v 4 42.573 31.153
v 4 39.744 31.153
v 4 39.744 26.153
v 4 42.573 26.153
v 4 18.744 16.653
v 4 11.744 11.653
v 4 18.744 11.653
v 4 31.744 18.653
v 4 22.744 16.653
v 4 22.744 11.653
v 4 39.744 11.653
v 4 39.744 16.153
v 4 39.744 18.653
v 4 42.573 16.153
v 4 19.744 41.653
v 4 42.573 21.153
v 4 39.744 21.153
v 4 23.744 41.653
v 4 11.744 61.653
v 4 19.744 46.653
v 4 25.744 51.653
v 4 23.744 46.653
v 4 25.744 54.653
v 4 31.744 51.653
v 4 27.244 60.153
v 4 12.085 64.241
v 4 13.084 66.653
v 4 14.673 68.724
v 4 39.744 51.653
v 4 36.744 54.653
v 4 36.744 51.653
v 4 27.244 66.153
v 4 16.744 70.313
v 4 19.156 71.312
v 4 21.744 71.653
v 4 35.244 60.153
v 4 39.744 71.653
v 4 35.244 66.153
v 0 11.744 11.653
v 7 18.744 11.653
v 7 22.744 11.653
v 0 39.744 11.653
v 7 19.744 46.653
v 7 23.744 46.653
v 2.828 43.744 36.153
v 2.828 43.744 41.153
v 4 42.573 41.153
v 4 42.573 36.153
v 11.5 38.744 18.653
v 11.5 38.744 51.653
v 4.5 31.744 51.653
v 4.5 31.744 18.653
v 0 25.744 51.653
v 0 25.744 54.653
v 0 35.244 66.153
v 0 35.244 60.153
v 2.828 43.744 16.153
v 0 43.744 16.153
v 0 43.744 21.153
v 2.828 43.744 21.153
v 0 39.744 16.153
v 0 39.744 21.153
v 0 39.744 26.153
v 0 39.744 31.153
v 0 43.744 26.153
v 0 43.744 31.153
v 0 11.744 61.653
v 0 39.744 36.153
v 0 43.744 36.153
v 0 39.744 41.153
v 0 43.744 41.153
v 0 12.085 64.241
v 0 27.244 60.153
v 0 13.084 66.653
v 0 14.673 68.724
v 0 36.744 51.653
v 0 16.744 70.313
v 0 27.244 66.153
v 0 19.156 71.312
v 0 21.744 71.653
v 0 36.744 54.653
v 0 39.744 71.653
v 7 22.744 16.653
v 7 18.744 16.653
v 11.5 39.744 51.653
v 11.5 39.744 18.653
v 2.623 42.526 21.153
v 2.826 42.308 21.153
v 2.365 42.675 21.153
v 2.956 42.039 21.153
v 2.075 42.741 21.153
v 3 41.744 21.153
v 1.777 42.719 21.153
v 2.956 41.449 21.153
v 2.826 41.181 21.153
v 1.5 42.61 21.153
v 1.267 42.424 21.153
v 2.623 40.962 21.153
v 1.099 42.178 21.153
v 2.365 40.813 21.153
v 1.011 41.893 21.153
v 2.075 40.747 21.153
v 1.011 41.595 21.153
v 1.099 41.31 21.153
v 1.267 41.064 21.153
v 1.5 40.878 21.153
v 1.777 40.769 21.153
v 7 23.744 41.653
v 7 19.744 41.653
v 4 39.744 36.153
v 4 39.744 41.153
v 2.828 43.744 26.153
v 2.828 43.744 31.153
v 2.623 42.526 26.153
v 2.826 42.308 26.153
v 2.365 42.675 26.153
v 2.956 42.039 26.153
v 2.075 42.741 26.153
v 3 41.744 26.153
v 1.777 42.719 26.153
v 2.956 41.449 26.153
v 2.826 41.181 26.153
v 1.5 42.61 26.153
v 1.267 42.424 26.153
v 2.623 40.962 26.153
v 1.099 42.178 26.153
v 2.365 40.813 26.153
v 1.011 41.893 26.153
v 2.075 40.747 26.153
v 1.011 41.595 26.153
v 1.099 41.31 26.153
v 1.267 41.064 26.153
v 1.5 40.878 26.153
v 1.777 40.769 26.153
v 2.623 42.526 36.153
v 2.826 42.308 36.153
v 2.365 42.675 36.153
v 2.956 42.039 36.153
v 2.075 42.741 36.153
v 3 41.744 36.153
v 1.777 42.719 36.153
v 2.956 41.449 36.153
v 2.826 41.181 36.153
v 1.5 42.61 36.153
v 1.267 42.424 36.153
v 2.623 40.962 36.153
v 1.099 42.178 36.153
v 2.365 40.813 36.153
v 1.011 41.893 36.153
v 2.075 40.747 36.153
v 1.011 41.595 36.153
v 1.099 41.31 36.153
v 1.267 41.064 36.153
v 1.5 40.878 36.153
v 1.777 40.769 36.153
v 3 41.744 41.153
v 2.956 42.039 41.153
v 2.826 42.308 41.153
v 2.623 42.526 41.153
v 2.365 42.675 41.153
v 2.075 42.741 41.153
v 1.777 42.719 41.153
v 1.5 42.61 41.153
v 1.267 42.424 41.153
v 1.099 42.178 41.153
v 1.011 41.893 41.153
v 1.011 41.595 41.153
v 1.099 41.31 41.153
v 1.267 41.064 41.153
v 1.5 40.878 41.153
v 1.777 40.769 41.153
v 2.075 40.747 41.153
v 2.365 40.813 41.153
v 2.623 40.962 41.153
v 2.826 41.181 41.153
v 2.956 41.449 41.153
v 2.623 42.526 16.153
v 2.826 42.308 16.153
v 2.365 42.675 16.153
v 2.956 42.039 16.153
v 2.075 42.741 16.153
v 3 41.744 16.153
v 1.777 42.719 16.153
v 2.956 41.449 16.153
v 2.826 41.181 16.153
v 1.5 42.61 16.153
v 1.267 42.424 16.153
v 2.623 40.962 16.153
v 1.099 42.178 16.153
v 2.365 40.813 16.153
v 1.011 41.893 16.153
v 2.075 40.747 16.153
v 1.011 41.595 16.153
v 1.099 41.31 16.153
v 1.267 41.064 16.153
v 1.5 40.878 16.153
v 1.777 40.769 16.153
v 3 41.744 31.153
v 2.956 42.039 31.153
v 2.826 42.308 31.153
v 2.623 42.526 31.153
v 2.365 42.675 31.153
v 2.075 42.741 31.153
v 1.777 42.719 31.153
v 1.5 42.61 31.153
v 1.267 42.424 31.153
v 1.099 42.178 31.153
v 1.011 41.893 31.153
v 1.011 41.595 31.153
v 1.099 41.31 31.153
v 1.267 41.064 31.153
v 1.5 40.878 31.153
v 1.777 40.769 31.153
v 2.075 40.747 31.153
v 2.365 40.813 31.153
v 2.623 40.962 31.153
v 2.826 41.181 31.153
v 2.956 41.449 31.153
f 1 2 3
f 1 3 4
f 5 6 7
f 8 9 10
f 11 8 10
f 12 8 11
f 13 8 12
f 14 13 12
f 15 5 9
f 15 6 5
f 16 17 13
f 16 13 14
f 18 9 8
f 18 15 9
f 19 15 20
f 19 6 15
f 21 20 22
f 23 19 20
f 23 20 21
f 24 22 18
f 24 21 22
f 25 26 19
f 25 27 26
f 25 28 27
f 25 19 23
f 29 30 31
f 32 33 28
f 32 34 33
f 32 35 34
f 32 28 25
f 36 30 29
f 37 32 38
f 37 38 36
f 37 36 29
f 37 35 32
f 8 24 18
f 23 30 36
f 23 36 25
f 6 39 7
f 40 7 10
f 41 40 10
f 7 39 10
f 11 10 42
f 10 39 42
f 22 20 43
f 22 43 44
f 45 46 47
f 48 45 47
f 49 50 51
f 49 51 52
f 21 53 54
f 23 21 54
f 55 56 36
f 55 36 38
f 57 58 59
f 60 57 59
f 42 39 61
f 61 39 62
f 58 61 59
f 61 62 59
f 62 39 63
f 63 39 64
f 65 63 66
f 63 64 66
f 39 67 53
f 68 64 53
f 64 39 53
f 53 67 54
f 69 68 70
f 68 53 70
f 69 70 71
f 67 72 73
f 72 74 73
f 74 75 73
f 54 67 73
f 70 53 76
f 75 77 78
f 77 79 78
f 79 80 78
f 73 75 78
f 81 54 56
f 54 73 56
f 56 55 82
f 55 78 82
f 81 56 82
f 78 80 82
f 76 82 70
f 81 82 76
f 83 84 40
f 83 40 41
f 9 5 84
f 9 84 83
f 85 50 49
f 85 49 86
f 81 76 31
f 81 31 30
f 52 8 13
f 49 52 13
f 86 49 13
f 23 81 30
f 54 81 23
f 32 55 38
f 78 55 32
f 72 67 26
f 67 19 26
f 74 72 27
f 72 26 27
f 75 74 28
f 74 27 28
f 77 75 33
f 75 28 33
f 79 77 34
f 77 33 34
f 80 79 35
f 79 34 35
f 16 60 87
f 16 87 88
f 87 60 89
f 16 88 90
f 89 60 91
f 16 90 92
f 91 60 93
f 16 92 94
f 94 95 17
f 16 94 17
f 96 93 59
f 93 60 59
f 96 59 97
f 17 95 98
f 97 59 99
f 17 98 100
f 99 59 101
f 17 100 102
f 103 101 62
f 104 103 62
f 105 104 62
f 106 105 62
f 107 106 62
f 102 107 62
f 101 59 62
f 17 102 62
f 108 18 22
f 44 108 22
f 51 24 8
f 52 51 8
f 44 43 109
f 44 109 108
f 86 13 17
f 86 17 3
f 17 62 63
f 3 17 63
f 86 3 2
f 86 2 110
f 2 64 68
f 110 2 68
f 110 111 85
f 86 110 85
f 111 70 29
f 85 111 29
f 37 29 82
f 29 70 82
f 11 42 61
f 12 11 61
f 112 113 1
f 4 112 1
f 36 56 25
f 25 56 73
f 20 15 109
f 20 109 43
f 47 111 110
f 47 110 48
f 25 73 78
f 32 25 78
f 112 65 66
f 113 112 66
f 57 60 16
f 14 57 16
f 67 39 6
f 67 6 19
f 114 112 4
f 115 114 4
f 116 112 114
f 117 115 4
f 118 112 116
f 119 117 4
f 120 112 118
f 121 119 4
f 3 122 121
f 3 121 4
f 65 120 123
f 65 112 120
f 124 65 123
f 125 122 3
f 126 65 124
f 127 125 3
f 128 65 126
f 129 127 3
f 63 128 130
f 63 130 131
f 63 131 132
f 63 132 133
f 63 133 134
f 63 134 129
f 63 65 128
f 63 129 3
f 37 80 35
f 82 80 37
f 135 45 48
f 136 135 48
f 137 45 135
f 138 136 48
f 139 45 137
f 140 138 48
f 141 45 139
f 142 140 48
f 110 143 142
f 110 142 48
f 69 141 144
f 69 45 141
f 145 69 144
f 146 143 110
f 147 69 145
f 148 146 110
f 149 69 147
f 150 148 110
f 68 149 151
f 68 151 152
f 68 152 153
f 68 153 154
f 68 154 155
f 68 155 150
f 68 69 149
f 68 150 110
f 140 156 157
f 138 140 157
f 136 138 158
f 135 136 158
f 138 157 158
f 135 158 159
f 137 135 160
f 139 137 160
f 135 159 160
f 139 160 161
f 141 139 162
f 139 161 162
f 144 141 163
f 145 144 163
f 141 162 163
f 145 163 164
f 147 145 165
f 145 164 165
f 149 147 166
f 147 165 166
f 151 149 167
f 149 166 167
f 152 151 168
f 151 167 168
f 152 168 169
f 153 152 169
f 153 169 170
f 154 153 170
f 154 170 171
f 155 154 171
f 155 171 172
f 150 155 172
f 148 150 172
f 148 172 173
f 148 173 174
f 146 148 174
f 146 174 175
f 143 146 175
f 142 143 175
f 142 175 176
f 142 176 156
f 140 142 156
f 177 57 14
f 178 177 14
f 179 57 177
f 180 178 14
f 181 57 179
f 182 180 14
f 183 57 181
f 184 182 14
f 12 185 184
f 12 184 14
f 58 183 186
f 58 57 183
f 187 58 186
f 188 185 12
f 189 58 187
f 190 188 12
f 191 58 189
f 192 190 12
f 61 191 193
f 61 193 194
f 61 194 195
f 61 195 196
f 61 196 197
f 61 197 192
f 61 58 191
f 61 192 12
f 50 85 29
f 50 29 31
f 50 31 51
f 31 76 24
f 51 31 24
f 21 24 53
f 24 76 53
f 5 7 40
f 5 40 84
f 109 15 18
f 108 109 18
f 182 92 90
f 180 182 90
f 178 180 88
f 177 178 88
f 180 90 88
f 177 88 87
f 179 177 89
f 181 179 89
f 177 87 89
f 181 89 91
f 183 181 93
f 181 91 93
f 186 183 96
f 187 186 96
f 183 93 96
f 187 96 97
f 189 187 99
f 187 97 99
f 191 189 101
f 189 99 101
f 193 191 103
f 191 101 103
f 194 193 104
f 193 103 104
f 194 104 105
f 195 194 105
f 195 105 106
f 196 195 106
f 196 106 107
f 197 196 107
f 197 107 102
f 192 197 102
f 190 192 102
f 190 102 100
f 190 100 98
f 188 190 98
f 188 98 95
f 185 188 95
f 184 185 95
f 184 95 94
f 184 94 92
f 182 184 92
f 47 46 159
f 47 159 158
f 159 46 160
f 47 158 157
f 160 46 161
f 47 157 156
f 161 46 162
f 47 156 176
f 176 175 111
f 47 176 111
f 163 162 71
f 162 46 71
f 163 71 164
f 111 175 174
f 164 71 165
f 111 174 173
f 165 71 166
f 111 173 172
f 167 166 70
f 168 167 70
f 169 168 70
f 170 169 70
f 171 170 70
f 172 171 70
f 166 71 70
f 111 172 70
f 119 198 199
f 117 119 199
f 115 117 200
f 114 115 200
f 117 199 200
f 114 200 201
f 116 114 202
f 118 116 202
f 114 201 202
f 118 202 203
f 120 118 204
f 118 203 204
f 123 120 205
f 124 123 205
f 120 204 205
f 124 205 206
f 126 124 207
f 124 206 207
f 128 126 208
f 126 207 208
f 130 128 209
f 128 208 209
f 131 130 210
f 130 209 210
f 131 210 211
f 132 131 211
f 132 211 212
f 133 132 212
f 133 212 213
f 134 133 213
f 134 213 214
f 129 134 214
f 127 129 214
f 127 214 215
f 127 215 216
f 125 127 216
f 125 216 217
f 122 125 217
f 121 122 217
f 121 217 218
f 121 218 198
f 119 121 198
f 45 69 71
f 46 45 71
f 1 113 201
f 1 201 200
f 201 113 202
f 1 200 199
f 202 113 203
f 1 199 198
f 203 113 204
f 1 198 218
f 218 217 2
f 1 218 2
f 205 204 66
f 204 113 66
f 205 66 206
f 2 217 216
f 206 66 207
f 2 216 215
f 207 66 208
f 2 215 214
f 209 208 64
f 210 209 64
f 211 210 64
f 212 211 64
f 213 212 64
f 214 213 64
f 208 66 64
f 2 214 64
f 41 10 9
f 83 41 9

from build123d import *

# Parameters (mm, degrees)
F0_W      = 28
F0_H      = 60
F1_DEPTH  = 4
F2_W      = 4
F2_H      = 5
F3_DEPTH  = 3
F4_W      = 4
F4_H      = 5
F5_DEPTH  = 4
F6_R      = 1
F7_DEPTH  = 25
F8_R      = 10
F9_W      = 8
F9_H      = 6
F9_R      = 1
F9_W_2    = 11
F9_H_2    = 3
F10_DEPTH = 25
F12_DEPTH = 7.5
F13_SIZE  = 7


with BuildPart() as f1:
    # F0 (on Right) → F1 (new body)
    with BuildSketch(Plane.YZ):
        with Locations((25.744221, 41.653179)):
            Rectangle(F0_W, F0_H)
    extrude(amount=F1_DEPTH)

    # F2 (on face) → F3 (join)
    with BuildSketch(Plane.YZ.offset(4)):
        with Locations((21.744221, 44.153179)):
            Rectangle(F2_W, F2_H)
        with Locations((20.744221, 14.153179)):
            Rectangle(F2_W, F2_H)
    extrude(amount=F3_DEPTH)

    # F4 (on face) → F5 (join)
    with BuildSketch(Plane(origin=(0, 0, 0), x_dir=(0, -1, 0), z_dir=(-1, 0, 0))):
        with Locations((-41.744221, 38.653179)):
            Rectangle(F4_W, F4_H)
        with Locations((-41.744221, 28.653179)):
            Rectangle(F4_W, F4_H)
        with Locations((-41.744221, 18.653179)):
            Rectangle(F4_W, F4_H)
    extrude(amount=-F5_DEPTH)

    # F6 (on face) → F7 (cut)
    with BuildSketch(Plane.XY.offset(41.153179)):
        with Locations((2, 41.744221)):
            Circle(F6_R)
        Polygon((4, 43.744221), (2.828427, 43.744221), (4, 42.572648), align=None)
    extrude(amount=-F7_DEPTH, mode=Mode.SUBTRACT)

    # F8
    f8_edges = [f1.edges().sort_by_distance(p)[0] for p in [
        (2, 11.744221, 71.653179),
    ]]
    fillet(f8_edges, radius=F8_R)

    # F9 (on face) → F10 (cut)
    with BuildSketch(Plane(origin=(0, 0, 0), x_dir=(0, -1, 0), z_dir=(-1, 0, 0))):
        with Locations((-31.244221, 63.153179)):
            Rectangle(F9_W, F9_H)
        with Locations((-31.244221, 63.153179)):
            Circle(F9_R, mode=Mode.SUBTRACT)
        with Locations((-31.244221, 63.153179)):
            Circle(F9_R)
        with Locations((-31.244221, 53.153179)):
            Rectangle(F9_W_2, F9_H_2)
    extrude(amount=-F10_DEPTH, mode=Mode.SUBTRACT)

    # F11 (on face) → F12 (join)
    with BuildSketch(Plane.YZ.offset(4)):
        Polygon((39.744221, 41.153179), (39.744221, 51.653179), (36.744221, 51.653179), (31.744221, 51.653179), (31.744221, 18.653179), (39.744221, 18.653179), (39.744221, 21.153179), (39.744221, 26.153179), (39.744221, 31.153179), (39.744221, 36.153179), align=None)
    extrude(amount=F12_DEPTH)

    # F13
    f13_edges = [f1.edges().sort_by_distance(p)[0] for p in [
        (11.5, 31.744221, 35.153179),
    ]]
    chamfer(f13_edges, length=F13_SIZE)


solid = f1.part
